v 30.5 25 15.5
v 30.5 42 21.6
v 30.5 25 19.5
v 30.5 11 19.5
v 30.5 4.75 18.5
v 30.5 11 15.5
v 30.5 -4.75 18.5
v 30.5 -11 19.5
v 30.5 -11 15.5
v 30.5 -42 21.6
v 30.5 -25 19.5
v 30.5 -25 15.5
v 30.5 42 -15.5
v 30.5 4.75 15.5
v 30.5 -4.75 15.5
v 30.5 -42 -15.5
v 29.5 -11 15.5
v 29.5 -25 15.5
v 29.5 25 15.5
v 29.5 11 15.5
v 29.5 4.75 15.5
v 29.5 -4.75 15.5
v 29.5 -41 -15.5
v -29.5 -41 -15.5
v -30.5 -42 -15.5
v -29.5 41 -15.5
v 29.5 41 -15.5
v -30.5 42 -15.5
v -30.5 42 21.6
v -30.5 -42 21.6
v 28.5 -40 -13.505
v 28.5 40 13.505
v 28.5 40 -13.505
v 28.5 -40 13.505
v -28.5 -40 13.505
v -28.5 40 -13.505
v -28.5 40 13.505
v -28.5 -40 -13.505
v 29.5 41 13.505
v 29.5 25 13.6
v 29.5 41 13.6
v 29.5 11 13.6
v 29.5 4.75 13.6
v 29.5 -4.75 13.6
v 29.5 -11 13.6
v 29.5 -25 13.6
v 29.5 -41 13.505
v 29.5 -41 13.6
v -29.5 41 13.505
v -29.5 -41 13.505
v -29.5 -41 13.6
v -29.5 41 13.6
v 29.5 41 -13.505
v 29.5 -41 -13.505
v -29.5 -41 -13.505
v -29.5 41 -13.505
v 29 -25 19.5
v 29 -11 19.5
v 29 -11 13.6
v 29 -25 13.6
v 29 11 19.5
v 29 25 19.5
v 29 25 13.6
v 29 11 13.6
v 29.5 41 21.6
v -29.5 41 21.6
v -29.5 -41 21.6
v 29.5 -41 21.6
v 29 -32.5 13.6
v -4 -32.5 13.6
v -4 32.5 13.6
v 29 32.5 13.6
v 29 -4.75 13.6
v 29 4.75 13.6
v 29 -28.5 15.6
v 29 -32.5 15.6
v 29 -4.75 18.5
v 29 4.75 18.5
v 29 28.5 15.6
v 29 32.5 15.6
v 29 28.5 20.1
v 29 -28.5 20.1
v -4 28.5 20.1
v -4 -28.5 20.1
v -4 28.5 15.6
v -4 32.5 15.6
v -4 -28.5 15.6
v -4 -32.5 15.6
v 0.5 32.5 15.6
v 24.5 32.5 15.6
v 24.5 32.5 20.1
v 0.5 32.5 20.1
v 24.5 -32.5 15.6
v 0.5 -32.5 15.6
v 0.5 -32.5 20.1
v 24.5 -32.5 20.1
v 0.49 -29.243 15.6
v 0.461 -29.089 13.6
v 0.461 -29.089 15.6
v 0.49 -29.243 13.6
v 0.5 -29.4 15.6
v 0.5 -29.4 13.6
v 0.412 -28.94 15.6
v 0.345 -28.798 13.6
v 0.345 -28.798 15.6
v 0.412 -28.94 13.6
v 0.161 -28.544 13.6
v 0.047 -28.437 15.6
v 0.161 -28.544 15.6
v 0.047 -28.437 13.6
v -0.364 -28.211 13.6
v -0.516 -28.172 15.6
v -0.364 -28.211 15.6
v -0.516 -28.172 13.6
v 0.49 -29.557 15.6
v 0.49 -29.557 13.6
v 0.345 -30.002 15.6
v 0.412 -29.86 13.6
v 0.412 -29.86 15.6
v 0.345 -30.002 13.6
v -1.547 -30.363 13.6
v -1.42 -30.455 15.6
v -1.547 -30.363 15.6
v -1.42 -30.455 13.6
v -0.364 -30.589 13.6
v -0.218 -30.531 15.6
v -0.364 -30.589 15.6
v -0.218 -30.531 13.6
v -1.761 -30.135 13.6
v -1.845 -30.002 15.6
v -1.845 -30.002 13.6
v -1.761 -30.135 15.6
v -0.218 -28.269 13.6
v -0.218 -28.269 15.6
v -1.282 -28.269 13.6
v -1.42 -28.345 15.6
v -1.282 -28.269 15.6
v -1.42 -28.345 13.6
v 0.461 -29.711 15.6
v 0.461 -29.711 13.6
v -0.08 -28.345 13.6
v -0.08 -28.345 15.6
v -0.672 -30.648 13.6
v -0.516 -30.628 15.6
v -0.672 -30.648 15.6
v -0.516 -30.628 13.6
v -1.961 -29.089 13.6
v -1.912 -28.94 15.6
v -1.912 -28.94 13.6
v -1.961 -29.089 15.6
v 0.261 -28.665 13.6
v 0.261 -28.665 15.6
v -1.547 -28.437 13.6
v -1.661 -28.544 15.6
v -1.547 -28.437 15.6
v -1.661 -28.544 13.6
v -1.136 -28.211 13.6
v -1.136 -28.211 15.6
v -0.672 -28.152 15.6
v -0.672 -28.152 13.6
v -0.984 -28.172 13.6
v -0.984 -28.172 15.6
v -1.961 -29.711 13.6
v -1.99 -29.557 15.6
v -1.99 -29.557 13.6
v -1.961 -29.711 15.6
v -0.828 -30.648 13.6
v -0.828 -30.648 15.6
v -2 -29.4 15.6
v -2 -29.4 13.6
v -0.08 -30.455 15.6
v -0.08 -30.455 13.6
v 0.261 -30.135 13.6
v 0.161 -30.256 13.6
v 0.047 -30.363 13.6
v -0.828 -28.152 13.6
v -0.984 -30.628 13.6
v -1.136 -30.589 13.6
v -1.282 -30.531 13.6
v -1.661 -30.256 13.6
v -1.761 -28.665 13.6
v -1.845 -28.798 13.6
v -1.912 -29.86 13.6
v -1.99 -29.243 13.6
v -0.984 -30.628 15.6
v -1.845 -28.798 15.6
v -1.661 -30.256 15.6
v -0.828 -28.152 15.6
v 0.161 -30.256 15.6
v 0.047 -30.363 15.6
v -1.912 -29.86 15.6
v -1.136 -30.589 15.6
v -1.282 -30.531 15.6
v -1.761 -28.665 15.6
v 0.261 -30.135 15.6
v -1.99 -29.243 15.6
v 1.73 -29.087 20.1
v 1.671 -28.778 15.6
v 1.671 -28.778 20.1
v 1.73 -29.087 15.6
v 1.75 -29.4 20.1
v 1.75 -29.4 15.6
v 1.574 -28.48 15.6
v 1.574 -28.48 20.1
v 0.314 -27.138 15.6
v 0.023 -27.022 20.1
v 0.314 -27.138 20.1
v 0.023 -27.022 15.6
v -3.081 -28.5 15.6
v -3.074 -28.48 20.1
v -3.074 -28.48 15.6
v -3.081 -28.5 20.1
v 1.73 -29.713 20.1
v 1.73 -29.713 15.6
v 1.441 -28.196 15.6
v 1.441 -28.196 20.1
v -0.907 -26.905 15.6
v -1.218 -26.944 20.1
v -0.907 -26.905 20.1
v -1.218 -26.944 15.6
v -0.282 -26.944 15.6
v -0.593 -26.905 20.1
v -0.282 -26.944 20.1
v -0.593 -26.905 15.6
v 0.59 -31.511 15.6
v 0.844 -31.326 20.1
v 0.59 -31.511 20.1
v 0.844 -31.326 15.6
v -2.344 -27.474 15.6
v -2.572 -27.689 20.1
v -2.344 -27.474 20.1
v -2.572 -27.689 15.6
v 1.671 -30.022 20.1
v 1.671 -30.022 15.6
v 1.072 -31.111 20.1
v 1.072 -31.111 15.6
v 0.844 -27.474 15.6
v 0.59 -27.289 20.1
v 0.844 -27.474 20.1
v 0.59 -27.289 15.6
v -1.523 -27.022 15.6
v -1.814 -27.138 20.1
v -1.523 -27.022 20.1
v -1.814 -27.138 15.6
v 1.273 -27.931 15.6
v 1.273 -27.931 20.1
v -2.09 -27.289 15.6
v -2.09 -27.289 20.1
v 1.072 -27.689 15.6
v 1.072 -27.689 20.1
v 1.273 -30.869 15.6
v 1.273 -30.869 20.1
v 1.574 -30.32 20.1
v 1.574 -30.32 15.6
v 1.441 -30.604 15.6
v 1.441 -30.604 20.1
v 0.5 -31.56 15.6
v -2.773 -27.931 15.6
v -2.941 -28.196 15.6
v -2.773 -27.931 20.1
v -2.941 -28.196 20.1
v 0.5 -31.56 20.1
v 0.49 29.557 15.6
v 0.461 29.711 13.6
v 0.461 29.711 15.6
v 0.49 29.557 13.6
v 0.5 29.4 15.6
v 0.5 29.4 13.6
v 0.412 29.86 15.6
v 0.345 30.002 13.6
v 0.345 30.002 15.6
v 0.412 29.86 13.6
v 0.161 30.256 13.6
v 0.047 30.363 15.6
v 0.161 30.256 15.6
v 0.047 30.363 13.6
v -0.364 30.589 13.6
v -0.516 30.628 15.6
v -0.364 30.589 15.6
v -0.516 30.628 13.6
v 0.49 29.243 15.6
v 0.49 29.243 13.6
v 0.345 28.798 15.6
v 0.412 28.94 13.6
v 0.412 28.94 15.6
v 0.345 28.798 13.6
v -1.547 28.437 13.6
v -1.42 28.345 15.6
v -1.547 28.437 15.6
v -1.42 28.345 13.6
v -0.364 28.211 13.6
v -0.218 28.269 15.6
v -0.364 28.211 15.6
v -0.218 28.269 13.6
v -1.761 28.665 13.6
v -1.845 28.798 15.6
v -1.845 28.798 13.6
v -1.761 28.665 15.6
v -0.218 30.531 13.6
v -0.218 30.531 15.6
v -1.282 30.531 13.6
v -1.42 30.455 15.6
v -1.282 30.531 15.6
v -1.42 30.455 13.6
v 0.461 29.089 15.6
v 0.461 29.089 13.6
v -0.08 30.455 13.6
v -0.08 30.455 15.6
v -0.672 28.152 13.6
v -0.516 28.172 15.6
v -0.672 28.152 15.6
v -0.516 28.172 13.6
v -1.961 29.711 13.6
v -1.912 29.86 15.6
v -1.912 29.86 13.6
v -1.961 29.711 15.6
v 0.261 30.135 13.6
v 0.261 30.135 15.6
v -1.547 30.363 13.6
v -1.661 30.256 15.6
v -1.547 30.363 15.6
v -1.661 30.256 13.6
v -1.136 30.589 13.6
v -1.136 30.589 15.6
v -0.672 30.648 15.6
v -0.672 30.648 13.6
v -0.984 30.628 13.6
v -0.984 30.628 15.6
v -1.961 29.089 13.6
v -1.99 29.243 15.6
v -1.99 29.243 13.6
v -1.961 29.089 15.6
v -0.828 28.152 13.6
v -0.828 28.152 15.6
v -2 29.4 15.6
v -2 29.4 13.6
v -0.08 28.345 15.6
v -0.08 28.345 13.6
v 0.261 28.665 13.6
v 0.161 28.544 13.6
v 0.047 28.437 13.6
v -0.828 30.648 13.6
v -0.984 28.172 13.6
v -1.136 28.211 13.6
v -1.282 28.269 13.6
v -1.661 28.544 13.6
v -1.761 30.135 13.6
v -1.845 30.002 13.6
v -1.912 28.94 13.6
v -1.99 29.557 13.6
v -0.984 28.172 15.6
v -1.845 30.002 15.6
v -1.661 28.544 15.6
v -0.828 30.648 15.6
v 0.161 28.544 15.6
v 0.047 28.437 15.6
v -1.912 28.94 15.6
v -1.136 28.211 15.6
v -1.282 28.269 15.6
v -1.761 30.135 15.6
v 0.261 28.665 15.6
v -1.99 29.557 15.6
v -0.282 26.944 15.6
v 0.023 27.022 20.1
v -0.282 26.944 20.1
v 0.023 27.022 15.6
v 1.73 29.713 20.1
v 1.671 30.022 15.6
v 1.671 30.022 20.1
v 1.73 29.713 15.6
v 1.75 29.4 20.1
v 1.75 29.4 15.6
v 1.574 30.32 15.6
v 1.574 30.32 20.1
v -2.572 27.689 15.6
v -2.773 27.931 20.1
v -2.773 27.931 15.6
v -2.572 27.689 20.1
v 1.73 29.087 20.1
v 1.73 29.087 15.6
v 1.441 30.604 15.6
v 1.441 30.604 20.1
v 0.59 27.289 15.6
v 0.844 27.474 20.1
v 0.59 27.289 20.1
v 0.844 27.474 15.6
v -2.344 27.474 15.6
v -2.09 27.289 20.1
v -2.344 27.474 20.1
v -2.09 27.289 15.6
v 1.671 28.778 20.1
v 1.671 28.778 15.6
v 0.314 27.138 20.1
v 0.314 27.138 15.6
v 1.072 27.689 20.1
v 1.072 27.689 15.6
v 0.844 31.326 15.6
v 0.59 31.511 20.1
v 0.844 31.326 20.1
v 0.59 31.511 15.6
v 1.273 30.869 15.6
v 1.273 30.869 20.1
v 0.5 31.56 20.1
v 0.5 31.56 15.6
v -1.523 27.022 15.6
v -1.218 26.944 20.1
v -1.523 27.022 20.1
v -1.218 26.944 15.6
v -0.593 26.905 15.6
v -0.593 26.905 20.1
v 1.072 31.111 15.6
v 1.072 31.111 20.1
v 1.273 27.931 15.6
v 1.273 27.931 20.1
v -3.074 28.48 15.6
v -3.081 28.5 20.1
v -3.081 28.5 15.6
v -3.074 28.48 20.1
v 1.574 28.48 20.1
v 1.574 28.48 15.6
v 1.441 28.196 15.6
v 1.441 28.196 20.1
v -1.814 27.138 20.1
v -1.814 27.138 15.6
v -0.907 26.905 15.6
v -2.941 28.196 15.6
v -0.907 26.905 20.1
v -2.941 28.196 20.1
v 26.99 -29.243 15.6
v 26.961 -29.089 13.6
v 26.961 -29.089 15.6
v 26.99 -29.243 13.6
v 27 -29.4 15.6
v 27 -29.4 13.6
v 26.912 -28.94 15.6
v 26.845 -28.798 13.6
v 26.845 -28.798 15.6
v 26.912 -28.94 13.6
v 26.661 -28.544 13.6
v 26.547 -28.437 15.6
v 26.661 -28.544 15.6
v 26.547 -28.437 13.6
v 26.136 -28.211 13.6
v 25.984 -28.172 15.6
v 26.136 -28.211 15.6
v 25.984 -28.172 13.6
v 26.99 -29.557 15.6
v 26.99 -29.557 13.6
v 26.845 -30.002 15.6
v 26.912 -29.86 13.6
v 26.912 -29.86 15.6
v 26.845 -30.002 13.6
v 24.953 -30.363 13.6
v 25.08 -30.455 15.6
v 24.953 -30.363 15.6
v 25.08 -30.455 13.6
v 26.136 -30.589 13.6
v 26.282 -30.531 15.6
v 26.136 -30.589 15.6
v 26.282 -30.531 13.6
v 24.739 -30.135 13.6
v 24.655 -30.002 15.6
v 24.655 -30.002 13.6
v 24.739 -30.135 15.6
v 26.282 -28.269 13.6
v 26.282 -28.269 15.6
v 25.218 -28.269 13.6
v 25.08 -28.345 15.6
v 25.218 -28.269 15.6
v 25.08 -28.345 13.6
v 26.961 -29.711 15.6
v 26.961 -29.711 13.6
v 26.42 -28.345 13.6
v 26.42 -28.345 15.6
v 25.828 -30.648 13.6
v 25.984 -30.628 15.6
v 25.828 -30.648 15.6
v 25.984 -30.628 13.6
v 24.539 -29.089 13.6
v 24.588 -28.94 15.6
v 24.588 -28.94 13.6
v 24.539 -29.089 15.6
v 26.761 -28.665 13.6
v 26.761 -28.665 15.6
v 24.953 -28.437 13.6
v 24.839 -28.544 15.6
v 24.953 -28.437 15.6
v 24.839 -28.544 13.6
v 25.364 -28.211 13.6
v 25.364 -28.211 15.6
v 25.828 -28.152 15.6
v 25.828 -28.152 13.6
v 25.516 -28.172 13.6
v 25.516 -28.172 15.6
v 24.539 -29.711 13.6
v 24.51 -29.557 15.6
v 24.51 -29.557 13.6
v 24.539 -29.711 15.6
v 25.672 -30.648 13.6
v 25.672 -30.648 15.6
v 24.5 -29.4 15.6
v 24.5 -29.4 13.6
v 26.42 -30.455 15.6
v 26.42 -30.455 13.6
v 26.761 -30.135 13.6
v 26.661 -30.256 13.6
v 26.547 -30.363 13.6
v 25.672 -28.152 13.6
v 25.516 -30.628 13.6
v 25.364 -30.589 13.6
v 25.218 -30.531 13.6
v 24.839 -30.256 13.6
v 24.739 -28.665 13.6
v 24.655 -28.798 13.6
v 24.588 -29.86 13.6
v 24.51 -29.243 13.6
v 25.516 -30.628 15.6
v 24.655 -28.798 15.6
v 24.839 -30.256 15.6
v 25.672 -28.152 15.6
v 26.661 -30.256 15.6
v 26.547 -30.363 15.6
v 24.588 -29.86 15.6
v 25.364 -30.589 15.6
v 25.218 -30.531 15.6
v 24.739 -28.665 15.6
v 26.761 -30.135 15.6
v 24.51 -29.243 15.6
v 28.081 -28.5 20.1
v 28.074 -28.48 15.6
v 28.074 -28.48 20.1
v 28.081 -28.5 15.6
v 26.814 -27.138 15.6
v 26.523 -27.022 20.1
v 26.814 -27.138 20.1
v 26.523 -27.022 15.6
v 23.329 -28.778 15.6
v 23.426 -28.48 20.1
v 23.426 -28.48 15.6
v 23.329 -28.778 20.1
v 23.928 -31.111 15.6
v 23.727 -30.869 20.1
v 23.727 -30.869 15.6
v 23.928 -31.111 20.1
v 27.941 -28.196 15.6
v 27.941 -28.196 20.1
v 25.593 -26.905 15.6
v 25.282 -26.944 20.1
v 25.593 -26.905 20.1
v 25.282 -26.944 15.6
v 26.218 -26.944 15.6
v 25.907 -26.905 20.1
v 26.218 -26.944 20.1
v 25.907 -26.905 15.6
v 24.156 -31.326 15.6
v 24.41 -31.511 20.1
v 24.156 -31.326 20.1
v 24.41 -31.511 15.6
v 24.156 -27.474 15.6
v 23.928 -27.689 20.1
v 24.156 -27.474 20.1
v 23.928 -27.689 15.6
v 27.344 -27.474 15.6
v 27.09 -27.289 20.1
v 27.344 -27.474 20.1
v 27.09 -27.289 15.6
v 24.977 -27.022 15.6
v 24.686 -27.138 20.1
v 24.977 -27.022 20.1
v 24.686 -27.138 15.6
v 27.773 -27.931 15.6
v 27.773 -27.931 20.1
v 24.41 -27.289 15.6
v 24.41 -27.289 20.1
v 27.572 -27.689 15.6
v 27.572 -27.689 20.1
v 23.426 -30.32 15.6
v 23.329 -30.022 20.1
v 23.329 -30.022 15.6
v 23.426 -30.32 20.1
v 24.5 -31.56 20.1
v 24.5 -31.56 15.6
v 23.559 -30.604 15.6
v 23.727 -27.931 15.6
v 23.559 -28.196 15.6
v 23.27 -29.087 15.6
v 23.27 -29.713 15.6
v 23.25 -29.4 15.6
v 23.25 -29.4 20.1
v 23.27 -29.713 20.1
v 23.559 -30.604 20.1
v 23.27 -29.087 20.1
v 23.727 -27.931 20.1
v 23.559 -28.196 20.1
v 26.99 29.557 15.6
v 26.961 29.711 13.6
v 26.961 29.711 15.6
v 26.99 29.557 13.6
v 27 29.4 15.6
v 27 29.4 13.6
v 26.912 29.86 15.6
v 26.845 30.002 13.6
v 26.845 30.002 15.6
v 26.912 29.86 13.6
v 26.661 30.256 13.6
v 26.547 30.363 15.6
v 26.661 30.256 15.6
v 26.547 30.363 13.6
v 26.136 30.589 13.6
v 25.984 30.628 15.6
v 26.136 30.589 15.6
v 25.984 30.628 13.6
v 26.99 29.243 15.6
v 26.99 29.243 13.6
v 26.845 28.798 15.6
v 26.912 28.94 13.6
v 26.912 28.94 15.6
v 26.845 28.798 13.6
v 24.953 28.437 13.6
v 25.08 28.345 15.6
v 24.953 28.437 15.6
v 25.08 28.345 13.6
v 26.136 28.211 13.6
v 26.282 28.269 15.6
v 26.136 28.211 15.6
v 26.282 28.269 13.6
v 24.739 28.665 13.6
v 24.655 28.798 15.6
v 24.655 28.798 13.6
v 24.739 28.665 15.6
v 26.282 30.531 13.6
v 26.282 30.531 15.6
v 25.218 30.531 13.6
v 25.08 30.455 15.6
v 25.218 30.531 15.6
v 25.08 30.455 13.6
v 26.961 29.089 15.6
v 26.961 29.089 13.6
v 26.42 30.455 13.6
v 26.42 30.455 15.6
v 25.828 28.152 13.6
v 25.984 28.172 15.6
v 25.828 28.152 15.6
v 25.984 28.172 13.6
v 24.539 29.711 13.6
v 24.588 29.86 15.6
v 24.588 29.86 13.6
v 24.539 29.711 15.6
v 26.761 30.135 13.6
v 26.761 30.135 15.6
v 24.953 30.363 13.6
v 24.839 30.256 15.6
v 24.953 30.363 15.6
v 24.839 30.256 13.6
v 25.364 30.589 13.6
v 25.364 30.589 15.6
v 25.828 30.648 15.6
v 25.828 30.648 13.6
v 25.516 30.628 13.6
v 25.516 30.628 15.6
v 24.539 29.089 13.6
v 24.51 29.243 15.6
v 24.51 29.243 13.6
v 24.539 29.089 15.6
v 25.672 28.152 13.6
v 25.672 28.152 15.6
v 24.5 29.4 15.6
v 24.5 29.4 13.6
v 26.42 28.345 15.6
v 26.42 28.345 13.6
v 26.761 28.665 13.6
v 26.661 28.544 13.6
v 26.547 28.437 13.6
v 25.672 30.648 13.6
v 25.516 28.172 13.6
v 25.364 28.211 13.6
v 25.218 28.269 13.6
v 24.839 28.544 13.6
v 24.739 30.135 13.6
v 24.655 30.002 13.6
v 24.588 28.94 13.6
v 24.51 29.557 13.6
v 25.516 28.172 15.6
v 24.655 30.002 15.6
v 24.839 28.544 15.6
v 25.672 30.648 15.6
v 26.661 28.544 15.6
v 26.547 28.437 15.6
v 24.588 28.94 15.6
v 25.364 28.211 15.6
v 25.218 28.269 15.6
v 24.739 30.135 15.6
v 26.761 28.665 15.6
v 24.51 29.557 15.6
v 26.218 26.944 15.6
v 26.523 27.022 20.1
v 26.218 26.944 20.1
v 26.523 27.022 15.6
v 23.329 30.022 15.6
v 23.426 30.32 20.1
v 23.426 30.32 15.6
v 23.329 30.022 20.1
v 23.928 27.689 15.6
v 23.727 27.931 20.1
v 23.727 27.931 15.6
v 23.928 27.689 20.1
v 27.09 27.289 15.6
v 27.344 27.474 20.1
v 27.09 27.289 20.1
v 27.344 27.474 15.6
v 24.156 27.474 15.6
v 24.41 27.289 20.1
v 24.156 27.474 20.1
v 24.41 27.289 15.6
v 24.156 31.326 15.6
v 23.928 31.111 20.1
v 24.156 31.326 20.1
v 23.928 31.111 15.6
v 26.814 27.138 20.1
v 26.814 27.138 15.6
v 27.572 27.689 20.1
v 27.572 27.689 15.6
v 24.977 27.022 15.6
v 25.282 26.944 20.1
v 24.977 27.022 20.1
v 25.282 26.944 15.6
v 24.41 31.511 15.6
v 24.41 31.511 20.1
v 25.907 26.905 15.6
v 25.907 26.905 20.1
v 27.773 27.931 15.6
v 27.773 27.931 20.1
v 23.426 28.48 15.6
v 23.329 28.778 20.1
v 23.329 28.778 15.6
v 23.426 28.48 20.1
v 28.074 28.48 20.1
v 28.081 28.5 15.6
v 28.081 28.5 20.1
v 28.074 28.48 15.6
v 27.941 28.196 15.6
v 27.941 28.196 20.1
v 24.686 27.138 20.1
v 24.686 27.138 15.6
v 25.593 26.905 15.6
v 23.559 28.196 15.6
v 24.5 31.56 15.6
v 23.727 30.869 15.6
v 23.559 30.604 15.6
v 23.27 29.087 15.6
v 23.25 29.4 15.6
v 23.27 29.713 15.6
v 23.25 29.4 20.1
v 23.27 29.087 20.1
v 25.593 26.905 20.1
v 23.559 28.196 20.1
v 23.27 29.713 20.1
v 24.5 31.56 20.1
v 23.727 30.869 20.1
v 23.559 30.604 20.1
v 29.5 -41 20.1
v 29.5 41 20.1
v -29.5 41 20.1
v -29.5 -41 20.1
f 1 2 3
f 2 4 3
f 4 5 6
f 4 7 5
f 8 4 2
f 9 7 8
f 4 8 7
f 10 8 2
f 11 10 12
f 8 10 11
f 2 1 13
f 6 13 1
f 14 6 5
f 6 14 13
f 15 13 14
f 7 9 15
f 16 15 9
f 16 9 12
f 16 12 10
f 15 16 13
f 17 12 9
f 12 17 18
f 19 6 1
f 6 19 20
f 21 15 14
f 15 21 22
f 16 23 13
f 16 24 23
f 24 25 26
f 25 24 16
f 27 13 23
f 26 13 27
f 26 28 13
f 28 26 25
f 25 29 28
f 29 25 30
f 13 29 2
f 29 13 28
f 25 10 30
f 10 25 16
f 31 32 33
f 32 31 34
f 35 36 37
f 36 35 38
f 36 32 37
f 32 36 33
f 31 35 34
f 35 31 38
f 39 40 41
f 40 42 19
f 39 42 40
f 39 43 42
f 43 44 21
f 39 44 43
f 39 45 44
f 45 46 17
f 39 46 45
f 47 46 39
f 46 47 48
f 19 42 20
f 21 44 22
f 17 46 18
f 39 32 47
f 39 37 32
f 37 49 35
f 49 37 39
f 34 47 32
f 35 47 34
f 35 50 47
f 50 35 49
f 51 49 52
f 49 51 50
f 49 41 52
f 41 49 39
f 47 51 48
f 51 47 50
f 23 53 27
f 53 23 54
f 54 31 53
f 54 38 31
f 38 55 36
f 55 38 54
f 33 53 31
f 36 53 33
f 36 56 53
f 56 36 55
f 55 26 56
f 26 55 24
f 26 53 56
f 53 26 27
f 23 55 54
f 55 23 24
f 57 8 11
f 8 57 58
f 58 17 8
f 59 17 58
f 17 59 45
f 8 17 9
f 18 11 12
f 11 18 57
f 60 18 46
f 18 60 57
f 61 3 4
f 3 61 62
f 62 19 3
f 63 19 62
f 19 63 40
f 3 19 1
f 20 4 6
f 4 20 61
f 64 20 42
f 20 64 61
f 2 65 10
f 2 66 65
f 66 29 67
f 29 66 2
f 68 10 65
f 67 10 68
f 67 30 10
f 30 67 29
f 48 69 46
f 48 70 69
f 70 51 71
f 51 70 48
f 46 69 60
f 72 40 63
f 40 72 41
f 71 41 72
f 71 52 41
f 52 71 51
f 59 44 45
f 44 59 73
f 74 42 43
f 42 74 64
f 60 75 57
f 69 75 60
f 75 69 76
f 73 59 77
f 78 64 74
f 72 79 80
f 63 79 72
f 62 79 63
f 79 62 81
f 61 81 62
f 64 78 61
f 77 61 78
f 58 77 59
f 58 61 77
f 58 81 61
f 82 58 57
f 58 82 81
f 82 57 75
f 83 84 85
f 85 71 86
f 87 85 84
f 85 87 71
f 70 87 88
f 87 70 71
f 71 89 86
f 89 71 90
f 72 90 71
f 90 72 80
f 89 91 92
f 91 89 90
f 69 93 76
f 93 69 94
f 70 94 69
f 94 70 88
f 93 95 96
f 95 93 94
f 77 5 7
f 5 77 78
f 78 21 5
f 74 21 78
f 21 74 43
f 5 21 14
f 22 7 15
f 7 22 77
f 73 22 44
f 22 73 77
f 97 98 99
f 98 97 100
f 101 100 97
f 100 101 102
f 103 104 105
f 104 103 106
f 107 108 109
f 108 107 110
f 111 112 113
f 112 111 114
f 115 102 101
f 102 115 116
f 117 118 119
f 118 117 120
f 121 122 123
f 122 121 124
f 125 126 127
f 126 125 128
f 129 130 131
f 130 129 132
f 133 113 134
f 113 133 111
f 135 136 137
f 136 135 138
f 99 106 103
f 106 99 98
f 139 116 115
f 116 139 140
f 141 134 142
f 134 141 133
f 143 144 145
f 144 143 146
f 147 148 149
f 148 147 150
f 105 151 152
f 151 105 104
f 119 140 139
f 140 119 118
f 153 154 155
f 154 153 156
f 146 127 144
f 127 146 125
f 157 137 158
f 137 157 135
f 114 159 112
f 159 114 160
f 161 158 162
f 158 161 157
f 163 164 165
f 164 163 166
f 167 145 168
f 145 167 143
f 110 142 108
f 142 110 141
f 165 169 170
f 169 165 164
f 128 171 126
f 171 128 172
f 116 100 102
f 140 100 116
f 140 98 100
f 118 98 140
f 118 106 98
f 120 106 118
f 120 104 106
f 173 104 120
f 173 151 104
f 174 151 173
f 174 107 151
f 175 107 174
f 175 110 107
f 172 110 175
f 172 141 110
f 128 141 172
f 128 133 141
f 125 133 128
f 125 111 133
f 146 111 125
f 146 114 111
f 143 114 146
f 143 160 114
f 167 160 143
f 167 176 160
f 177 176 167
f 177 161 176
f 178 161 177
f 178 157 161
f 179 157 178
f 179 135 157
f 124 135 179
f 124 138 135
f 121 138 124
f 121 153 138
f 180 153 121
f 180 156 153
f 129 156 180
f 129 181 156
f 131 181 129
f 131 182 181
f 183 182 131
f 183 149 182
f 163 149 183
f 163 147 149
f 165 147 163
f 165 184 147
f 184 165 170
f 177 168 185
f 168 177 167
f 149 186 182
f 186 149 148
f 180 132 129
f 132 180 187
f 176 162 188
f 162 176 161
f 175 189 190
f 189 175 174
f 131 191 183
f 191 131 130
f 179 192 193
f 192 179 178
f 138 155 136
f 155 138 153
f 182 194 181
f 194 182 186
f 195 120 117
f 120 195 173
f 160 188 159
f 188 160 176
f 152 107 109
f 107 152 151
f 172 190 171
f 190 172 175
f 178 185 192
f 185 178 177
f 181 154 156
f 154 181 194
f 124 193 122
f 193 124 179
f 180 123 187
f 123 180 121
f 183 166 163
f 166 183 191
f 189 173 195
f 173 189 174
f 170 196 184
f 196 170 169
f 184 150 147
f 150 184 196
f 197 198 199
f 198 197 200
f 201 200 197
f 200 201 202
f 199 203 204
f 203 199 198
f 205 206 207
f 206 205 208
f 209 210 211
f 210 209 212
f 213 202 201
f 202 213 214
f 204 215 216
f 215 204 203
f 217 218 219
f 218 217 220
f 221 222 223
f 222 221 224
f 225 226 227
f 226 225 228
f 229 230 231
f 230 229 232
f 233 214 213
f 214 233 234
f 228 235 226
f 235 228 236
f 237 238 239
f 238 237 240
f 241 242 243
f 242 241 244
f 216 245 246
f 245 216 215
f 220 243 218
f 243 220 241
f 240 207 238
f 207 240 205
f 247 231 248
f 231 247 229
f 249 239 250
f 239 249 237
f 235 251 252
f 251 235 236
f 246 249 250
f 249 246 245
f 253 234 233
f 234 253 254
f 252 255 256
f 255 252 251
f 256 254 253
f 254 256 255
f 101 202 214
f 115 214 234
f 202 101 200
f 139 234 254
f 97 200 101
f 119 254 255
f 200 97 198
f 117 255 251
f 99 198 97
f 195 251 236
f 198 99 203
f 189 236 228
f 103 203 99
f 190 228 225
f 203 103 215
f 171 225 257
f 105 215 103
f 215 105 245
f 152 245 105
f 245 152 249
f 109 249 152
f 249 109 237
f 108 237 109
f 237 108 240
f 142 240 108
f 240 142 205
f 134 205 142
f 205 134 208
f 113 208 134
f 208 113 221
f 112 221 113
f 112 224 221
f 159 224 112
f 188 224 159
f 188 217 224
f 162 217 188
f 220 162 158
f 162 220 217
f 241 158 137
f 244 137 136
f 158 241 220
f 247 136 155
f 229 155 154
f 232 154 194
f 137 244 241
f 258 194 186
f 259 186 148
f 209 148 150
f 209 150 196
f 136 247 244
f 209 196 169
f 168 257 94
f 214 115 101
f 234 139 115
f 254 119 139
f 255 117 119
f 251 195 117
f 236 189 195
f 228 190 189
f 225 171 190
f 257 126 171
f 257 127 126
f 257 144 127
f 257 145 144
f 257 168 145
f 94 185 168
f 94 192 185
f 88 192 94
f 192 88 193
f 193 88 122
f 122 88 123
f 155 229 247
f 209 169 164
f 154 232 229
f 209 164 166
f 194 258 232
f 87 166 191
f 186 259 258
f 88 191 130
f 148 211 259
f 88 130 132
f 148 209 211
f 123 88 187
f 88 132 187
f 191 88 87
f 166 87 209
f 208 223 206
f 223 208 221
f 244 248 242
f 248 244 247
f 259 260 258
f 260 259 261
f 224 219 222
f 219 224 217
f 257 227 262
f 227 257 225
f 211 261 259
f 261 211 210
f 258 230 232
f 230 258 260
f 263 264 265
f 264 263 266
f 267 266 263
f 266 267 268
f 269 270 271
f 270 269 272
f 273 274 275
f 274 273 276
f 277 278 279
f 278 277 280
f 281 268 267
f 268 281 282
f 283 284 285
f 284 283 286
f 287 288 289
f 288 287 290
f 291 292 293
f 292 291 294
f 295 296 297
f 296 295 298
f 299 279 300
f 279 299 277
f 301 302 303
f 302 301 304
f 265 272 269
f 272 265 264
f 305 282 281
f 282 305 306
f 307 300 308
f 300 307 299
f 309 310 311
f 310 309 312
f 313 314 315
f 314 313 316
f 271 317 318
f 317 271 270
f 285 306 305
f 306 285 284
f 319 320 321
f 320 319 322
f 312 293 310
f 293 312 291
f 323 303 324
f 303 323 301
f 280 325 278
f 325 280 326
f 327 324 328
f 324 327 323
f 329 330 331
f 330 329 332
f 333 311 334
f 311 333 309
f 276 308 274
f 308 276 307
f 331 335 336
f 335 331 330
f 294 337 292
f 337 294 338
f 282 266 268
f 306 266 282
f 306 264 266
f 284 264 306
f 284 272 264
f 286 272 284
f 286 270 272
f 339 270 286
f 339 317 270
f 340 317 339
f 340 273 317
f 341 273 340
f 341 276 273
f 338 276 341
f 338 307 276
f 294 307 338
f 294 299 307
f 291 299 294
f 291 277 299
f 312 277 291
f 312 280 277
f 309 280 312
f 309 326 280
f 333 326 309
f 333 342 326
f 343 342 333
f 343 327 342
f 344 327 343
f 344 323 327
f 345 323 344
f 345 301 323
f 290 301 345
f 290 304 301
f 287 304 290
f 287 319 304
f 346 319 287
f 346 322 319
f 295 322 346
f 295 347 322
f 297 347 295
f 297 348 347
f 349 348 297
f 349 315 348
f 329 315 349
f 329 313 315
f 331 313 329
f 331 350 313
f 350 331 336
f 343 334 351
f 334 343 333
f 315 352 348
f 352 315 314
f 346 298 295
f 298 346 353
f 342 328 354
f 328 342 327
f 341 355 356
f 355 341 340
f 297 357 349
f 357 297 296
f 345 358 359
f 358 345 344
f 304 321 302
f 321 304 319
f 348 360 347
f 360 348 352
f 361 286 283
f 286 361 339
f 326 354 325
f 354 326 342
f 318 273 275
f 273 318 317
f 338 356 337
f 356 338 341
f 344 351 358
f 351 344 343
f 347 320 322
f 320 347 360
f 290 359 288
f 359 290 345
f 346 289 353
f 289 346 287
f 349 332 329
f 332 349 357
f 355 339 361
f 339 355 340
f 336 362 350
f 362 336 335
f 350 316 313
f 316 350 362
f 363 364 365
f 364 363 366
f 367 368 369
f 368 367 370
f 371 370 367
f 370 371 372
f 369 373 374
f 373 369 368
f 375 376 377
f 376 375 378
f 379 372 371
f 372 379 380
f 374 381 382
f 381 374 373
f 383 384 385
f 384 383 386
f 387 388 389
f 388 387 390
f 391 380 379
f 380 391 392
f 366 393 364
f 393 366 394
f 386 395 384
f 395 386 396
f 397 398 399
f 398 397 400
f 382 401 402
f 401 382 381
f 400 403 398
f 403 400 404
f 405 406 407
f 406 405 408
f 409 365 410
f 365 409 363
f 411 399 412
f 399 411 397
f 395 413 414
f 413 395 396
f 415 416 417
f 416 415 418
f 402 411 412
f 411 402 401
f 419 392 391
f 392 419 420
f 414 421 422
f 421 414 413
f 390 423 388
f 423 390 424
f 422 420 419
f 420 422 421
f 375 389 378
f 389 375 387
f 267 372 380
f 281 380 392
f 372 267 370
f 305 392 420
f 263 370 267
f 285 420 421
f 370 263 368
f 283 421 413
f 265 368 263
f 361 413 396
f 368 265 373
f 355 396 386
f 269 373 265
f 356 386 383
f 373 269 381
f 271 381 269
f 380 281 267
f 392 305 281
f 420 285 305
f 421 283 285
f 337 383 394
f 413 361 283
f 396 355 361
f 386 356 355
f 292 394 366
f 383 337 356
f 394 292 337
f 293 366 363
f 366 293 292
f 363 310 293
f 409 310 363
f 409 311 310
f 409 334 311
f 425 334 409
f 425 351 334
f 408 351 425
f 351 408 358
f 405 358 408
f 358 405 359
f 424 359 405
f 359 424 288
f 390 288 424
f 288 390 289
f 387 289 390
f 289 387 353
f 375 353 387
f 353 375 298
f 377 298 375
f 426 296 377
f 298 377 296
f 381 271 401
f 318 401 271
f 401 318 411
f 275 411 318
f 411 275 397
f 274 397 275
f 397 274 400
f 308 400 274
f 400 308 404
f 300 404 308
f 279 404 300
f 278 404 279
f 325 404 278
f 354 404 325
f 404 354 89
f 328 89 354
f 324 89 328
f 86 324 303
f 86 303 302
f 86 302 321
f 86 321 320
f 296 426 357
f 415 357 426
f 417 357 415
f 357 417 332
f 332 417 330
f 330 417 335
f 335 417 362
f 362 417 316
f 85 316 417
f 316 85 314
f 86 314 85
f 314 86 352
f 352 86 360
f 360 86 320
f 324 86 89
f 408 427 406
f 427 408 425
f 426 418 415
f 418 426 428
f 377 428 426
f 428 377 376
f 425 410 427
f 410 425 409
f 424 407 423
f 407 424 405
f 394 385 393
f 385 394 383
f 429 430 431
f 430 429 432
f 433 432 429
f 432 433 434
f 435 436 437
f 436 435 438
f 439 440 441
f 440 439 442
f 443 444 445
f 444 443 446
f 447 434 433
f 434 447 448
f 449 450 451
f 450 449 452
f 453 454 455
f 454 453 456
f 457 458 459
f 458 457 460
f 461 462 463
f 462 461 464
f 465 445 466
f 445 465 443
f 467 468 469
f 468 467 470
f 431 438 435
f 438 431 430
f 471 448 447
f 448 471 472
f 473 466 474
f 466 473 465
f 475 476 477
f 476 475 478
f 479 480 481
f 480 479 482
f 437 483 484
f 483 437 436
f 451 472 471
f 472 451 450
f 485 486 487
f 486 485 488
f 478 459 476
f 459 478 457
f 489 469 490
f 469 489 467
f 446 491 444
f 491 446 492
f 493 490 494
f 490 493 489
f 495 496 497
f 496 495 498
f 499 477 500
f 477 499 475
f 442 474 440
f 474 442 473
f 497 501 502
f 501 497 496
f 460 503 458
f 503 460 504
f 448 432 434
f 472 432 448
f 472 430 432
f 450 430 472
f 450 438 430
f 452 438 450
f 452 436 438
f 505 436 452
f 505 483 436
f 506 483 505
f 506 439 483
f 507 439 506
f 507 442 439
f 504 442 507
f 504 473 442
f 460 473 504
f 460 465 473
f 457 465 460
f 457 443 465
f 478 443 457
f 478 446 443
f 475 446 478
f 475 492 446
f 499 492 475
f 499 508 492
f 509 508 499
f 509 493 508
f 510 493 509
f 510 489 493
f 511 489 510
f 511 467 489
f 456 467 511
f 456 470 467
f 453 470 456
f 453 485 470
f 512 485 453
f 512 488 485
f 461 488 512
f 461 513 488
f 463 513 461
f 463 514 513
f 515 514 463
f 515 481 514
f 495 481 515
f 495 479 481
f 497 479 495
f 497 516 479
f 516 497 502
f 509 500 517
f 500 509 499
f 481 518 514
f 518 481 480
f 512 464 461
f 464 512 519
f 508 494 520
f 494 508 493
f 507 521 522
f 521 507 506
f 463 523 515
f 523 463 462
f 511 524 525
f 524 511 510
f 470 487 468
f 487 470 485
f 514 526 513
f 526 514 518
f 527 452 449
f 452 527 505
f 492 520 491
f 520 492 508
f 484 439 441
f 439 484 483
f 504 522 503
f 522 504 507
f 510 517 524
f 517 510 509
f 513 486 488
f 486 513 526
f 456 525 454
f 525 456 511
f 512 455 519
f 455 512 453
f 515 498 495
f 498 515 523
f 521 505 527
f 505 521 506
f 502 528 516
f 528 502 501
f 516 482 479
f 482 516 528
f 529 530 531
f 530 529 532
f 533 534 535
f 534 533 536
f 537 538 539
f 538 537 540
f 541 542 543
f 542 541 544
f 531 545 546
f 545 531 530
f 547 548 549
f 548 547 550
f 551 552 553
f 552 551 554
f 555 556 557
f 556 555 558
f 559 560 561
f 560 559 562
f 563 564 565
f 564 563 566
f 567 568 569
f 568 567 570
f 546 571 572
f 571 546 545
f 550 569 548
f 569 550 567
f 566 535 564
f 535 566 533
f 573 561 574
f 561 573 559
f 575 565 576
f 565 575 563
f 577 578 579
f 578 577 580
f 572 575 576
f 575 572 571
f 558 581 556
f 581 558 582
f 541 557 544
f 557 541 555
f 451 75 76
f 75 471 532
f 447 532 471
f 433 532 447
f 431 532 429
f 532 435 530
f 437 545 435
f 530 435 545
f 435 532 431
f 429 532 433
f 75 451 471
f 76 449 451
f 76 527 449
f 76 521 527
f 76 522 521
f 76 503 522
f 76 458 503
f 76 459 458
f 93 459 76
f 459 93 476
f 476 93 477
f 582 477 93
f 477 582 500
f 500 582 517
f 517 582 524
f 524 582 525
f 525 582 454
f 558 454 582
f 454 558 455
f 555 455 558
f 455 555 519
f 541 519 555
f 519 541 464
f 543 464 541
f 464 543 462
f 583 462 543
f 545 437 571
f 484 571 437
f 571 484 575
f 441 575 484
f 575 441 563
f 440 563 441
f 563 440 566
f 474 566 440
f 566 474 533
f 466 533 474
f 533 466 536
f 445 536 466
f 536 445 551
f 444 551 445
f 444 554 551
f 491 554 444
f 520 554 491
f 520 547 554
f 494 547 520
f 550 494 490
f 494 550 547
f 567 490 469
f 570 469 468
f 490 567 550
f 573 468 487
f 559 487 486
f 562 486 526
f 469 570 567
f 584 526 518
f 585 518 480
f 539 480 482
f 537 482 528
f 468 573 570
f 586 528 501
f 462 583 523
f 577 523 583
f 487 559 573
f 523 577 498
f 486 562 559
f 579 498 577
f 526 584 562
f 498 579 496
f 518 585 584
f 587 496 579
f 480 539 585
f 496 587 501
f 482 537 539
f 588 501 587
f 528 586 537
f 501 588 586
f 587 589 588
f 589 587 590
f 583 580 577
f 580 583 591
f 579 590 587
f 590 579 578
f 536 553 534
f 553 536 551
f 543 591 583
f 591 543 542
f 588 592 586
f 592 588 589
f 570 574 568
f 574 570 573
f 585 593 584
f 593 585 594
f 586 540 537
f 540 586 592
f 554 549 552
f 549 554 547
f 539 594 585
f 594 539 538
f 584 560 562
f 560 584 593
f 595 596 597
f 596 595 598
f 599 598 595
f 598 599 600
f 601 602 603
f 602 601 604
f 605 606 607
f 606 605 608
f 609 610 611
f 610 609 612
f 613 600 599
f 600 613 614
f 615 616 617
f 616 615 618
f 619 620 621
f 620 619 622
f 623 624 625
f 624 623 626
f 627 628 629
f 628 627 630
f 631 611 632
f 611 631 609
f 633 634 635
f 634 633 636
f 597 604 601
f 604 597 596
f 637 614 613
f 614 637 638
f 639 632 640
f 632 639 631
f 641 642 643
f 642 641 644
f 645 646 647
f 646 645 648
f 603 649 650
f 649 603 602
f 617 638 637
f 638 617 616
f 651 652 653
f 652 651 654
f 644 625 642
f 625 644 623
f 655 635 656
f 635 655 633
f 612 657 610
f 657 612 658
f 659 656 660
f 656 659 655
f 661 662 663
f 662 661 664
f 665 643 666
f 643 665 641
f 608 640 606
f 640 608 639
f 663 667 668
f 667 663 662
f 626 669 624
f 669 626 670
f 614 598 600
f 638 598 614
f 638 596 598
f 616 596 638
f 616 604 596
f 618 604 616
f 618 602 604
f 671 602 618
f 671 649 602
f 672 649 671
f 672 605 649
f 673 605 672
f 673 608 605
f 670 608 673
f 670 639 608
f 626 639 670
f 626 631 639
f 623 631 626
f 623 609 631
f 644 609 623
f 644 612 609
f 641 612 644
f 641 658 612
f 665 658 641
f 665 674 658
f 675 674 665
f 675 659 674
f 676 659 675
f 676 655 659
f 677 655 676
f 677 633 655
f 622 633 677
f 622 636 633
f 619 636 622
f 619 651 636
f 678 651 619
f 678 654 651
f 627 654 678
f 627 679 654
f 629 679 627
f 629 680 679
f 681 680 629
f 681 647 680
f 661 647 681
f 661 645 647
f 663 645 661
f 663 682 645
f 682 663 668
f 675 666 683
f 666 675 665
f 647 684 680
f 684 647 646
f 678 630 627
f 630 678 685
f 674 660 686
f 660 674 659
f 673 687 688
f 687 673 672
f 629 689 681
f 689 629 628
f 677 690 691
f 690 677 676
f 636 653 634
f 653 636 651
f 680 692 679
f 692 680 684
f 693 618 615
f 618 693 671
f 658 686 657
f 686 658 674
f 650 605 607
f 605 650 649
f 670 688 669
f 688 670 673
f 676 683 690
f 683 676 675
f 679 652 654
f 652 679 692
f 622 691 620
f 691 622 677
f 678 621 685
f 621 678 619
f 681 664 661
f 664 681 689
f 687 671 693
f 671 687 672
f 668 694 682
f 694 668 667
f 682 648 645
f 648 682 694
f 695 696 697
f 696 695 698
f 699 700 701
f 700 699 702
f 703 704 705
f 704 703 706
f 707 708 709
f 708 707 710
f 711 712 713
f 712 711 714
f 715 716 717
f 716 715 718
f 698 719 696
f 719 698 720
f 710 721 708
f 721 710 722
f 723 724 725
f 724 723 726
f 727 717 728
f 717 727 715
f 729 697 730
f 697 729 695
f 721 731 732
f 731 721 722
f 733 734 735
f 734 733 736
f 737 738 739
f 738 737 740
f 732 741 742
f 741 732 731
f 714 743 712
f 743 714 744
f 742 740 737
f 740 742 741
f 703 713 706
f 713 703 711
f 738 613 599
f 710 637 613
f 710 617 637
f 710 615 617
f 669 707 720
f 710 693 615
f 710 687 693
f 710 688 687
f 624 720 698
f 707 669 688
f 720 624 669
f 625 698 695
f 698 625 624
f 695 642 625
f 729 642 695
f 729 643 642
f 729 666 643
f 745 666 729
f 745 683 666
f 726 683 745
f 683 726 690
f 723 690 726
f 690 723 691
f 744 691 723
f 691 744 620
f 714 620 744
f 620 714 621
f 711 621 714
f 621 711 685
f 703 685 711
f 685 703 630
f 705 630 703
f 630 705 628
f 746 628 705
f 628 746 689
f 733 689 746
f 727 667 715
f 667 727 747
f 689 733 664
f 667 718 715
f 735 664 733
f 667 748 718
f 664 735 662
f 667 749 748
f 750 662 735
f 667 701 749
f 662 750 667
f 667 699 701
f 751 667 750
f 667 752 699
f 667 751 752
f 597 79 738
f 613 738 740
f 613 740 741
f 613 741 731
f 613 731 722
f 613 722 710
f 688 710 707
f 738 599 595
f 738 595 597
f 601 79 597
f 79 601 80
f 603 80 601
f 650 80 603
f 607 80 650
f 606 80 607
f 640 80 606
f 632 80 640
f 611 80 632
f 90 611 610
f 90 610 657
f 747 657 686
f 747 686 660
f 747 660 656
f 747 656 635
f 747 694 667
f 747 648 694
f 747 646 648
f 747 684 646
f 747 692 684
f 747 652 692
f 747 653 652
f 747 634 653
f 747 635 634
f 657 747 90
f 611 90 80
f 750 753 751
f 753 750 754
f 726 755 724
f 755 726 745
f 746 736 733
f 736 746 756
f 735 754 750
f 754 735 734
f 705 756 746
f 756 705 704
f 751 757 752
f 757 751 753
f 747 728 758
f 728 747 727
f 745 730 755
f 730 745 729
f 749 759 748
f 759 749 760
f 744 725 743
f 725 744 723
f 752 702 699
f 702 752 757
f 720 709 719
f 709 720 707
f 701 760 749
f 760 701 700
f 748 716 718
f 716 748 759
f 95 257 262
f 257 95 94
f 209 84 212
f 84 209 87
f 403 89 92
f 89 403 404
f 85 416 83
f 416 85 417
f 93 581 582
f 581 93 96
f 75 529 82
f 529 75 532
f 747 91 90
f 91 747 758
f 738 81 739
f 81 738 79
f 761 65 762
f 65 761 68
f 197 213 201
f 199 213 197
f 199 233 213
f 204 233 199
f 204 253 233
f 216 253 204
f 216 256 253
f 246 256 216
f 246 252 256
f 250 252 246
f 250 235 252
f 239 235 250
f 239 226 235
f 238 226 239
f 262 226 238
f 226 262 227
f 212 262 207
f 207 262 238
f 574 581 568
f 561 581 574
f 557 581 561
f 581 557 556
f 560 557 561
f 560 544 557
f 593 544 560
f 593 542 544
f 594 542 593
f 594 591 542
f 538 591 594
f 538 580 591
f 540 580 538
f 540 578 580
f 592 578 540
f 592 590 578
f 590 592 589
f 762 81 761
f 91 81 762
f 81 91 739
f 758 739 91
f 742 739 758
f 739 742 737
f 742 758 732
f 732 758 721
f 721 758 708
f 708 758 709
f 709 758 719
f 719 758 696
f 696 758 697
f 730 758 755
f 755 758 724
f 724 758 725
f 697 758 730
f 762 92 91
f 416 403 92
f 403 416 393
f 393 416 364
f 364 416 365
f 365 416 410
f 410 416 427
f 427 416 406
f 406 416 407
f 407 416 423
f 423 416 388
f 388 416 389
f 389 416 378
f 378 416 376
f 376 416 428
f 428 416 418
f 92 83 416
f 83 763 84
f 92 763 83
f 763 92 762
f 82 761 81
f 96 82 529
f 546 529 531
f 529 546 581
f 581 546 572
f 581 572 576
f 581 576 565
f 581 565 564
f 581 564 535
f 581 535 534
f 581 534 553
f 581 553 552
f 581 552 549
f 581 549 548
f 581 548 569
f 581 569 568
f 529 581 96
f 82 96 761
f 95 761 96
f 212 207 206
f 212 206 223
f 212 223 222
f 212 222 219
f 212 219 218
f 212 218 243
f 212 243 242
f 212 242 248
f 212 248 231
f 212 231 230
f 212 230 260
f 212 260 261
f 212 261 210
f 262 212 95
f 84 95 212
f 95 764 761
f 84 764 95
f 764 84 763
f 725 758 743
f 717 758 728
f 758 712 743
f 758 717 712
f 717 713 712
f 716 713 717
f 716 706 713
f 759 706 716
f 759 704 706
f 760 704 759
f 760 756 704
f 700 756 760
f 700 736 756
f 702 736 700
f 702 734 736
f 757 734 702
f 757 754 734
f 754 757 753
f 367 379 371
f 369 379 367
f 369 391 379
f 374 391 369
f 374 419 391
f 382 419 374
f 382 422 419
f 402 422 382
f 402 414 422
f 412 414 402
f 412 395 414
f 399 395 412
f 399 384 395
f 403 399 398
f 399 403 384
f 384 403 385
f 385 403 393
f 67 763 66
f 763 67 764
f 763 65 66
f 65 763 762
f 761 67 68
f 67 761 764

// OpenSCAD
$fn=50;

w_batt = 57;
h_batt = 80;
t_batt = 27;

t_wall = 2.0;

module batt() {
    color("green") {
        translate([11.5, 0, t_batt / 2 + 3])
            cube(size=[33, 65, 6], center=true);
    }
    color("grey")
        cube(size=[w_batt, h_batt, t_batt], center=true);
}

module box() {
    difference() {
        cube(size=[w_batt + 2 * t_wall, h_batt + 2 * t_wall, t_batt + 2 * t_wall], center=true);
        translate([0, 0, 0])
            cube(size=[w_batt, h_batt, t_batt + 5], center=true);
        translate([0, 0, (t_batt + t_wall + 0.01) / 2])
            cube(size=[w_batt + t_wall, h_batt + t_wall, t_wall], center=true);
        translate([0, 0, -(t_batt + t_wall + 0.01) / 2])
            cube(size=[w_batt + t_wall, h_batt + t_wall, t_wall], center=true);
    }
}

h_lid = 6 + t_wall;
module lid(){
    difference() {
        cube(size=[w_batt + 2 * t_wall, h_batt + 2 * t_wall, h_lid], center=true);

        // cavity for PCB
        translate([12.5, 0, -2])
            cube(size=[33, 65, 10], center=true);

        // cut 2 big USB holes
        for (i = [-1, 1])
            translate([30, i * 18, -1.1])
                cube(size=[10, 14, 6], center=true);

        // cut middle USB hole
        translate([30, 0, -1.6])
            cube(size=[10, 9.5, 5], center=true);
    }

    translate([12.5, 0, -1.5]) {
        corners(26.5, 58.8)
            union() {
                cylinder(d=2.5, h=5, center=true);
                translate([0, 0, 2])
                    cylinder(d=5, h=5, center=true);
            }
    translate([0, 0, 2])
        corners(30, 62)
            cube(size=[6, 5, 5], center=true);
    }
}

module corners(w=10, h=5) {
    for (i = [-1, 1])
        for (j = [-1, 1])
            translate([w / 2 * i, h / 2 * j, 0]) children(0);
}


// batt();
box();

translate([0, 0, 17.6])
    difference() {
        lid();
        // notch
        translate([0, 0, t_wall / 2 + h_lid / 2 - 1.5])
            cube(size=[w_batt + t_wall, h_batt + t_wall, t_wall], center=true);
    }
